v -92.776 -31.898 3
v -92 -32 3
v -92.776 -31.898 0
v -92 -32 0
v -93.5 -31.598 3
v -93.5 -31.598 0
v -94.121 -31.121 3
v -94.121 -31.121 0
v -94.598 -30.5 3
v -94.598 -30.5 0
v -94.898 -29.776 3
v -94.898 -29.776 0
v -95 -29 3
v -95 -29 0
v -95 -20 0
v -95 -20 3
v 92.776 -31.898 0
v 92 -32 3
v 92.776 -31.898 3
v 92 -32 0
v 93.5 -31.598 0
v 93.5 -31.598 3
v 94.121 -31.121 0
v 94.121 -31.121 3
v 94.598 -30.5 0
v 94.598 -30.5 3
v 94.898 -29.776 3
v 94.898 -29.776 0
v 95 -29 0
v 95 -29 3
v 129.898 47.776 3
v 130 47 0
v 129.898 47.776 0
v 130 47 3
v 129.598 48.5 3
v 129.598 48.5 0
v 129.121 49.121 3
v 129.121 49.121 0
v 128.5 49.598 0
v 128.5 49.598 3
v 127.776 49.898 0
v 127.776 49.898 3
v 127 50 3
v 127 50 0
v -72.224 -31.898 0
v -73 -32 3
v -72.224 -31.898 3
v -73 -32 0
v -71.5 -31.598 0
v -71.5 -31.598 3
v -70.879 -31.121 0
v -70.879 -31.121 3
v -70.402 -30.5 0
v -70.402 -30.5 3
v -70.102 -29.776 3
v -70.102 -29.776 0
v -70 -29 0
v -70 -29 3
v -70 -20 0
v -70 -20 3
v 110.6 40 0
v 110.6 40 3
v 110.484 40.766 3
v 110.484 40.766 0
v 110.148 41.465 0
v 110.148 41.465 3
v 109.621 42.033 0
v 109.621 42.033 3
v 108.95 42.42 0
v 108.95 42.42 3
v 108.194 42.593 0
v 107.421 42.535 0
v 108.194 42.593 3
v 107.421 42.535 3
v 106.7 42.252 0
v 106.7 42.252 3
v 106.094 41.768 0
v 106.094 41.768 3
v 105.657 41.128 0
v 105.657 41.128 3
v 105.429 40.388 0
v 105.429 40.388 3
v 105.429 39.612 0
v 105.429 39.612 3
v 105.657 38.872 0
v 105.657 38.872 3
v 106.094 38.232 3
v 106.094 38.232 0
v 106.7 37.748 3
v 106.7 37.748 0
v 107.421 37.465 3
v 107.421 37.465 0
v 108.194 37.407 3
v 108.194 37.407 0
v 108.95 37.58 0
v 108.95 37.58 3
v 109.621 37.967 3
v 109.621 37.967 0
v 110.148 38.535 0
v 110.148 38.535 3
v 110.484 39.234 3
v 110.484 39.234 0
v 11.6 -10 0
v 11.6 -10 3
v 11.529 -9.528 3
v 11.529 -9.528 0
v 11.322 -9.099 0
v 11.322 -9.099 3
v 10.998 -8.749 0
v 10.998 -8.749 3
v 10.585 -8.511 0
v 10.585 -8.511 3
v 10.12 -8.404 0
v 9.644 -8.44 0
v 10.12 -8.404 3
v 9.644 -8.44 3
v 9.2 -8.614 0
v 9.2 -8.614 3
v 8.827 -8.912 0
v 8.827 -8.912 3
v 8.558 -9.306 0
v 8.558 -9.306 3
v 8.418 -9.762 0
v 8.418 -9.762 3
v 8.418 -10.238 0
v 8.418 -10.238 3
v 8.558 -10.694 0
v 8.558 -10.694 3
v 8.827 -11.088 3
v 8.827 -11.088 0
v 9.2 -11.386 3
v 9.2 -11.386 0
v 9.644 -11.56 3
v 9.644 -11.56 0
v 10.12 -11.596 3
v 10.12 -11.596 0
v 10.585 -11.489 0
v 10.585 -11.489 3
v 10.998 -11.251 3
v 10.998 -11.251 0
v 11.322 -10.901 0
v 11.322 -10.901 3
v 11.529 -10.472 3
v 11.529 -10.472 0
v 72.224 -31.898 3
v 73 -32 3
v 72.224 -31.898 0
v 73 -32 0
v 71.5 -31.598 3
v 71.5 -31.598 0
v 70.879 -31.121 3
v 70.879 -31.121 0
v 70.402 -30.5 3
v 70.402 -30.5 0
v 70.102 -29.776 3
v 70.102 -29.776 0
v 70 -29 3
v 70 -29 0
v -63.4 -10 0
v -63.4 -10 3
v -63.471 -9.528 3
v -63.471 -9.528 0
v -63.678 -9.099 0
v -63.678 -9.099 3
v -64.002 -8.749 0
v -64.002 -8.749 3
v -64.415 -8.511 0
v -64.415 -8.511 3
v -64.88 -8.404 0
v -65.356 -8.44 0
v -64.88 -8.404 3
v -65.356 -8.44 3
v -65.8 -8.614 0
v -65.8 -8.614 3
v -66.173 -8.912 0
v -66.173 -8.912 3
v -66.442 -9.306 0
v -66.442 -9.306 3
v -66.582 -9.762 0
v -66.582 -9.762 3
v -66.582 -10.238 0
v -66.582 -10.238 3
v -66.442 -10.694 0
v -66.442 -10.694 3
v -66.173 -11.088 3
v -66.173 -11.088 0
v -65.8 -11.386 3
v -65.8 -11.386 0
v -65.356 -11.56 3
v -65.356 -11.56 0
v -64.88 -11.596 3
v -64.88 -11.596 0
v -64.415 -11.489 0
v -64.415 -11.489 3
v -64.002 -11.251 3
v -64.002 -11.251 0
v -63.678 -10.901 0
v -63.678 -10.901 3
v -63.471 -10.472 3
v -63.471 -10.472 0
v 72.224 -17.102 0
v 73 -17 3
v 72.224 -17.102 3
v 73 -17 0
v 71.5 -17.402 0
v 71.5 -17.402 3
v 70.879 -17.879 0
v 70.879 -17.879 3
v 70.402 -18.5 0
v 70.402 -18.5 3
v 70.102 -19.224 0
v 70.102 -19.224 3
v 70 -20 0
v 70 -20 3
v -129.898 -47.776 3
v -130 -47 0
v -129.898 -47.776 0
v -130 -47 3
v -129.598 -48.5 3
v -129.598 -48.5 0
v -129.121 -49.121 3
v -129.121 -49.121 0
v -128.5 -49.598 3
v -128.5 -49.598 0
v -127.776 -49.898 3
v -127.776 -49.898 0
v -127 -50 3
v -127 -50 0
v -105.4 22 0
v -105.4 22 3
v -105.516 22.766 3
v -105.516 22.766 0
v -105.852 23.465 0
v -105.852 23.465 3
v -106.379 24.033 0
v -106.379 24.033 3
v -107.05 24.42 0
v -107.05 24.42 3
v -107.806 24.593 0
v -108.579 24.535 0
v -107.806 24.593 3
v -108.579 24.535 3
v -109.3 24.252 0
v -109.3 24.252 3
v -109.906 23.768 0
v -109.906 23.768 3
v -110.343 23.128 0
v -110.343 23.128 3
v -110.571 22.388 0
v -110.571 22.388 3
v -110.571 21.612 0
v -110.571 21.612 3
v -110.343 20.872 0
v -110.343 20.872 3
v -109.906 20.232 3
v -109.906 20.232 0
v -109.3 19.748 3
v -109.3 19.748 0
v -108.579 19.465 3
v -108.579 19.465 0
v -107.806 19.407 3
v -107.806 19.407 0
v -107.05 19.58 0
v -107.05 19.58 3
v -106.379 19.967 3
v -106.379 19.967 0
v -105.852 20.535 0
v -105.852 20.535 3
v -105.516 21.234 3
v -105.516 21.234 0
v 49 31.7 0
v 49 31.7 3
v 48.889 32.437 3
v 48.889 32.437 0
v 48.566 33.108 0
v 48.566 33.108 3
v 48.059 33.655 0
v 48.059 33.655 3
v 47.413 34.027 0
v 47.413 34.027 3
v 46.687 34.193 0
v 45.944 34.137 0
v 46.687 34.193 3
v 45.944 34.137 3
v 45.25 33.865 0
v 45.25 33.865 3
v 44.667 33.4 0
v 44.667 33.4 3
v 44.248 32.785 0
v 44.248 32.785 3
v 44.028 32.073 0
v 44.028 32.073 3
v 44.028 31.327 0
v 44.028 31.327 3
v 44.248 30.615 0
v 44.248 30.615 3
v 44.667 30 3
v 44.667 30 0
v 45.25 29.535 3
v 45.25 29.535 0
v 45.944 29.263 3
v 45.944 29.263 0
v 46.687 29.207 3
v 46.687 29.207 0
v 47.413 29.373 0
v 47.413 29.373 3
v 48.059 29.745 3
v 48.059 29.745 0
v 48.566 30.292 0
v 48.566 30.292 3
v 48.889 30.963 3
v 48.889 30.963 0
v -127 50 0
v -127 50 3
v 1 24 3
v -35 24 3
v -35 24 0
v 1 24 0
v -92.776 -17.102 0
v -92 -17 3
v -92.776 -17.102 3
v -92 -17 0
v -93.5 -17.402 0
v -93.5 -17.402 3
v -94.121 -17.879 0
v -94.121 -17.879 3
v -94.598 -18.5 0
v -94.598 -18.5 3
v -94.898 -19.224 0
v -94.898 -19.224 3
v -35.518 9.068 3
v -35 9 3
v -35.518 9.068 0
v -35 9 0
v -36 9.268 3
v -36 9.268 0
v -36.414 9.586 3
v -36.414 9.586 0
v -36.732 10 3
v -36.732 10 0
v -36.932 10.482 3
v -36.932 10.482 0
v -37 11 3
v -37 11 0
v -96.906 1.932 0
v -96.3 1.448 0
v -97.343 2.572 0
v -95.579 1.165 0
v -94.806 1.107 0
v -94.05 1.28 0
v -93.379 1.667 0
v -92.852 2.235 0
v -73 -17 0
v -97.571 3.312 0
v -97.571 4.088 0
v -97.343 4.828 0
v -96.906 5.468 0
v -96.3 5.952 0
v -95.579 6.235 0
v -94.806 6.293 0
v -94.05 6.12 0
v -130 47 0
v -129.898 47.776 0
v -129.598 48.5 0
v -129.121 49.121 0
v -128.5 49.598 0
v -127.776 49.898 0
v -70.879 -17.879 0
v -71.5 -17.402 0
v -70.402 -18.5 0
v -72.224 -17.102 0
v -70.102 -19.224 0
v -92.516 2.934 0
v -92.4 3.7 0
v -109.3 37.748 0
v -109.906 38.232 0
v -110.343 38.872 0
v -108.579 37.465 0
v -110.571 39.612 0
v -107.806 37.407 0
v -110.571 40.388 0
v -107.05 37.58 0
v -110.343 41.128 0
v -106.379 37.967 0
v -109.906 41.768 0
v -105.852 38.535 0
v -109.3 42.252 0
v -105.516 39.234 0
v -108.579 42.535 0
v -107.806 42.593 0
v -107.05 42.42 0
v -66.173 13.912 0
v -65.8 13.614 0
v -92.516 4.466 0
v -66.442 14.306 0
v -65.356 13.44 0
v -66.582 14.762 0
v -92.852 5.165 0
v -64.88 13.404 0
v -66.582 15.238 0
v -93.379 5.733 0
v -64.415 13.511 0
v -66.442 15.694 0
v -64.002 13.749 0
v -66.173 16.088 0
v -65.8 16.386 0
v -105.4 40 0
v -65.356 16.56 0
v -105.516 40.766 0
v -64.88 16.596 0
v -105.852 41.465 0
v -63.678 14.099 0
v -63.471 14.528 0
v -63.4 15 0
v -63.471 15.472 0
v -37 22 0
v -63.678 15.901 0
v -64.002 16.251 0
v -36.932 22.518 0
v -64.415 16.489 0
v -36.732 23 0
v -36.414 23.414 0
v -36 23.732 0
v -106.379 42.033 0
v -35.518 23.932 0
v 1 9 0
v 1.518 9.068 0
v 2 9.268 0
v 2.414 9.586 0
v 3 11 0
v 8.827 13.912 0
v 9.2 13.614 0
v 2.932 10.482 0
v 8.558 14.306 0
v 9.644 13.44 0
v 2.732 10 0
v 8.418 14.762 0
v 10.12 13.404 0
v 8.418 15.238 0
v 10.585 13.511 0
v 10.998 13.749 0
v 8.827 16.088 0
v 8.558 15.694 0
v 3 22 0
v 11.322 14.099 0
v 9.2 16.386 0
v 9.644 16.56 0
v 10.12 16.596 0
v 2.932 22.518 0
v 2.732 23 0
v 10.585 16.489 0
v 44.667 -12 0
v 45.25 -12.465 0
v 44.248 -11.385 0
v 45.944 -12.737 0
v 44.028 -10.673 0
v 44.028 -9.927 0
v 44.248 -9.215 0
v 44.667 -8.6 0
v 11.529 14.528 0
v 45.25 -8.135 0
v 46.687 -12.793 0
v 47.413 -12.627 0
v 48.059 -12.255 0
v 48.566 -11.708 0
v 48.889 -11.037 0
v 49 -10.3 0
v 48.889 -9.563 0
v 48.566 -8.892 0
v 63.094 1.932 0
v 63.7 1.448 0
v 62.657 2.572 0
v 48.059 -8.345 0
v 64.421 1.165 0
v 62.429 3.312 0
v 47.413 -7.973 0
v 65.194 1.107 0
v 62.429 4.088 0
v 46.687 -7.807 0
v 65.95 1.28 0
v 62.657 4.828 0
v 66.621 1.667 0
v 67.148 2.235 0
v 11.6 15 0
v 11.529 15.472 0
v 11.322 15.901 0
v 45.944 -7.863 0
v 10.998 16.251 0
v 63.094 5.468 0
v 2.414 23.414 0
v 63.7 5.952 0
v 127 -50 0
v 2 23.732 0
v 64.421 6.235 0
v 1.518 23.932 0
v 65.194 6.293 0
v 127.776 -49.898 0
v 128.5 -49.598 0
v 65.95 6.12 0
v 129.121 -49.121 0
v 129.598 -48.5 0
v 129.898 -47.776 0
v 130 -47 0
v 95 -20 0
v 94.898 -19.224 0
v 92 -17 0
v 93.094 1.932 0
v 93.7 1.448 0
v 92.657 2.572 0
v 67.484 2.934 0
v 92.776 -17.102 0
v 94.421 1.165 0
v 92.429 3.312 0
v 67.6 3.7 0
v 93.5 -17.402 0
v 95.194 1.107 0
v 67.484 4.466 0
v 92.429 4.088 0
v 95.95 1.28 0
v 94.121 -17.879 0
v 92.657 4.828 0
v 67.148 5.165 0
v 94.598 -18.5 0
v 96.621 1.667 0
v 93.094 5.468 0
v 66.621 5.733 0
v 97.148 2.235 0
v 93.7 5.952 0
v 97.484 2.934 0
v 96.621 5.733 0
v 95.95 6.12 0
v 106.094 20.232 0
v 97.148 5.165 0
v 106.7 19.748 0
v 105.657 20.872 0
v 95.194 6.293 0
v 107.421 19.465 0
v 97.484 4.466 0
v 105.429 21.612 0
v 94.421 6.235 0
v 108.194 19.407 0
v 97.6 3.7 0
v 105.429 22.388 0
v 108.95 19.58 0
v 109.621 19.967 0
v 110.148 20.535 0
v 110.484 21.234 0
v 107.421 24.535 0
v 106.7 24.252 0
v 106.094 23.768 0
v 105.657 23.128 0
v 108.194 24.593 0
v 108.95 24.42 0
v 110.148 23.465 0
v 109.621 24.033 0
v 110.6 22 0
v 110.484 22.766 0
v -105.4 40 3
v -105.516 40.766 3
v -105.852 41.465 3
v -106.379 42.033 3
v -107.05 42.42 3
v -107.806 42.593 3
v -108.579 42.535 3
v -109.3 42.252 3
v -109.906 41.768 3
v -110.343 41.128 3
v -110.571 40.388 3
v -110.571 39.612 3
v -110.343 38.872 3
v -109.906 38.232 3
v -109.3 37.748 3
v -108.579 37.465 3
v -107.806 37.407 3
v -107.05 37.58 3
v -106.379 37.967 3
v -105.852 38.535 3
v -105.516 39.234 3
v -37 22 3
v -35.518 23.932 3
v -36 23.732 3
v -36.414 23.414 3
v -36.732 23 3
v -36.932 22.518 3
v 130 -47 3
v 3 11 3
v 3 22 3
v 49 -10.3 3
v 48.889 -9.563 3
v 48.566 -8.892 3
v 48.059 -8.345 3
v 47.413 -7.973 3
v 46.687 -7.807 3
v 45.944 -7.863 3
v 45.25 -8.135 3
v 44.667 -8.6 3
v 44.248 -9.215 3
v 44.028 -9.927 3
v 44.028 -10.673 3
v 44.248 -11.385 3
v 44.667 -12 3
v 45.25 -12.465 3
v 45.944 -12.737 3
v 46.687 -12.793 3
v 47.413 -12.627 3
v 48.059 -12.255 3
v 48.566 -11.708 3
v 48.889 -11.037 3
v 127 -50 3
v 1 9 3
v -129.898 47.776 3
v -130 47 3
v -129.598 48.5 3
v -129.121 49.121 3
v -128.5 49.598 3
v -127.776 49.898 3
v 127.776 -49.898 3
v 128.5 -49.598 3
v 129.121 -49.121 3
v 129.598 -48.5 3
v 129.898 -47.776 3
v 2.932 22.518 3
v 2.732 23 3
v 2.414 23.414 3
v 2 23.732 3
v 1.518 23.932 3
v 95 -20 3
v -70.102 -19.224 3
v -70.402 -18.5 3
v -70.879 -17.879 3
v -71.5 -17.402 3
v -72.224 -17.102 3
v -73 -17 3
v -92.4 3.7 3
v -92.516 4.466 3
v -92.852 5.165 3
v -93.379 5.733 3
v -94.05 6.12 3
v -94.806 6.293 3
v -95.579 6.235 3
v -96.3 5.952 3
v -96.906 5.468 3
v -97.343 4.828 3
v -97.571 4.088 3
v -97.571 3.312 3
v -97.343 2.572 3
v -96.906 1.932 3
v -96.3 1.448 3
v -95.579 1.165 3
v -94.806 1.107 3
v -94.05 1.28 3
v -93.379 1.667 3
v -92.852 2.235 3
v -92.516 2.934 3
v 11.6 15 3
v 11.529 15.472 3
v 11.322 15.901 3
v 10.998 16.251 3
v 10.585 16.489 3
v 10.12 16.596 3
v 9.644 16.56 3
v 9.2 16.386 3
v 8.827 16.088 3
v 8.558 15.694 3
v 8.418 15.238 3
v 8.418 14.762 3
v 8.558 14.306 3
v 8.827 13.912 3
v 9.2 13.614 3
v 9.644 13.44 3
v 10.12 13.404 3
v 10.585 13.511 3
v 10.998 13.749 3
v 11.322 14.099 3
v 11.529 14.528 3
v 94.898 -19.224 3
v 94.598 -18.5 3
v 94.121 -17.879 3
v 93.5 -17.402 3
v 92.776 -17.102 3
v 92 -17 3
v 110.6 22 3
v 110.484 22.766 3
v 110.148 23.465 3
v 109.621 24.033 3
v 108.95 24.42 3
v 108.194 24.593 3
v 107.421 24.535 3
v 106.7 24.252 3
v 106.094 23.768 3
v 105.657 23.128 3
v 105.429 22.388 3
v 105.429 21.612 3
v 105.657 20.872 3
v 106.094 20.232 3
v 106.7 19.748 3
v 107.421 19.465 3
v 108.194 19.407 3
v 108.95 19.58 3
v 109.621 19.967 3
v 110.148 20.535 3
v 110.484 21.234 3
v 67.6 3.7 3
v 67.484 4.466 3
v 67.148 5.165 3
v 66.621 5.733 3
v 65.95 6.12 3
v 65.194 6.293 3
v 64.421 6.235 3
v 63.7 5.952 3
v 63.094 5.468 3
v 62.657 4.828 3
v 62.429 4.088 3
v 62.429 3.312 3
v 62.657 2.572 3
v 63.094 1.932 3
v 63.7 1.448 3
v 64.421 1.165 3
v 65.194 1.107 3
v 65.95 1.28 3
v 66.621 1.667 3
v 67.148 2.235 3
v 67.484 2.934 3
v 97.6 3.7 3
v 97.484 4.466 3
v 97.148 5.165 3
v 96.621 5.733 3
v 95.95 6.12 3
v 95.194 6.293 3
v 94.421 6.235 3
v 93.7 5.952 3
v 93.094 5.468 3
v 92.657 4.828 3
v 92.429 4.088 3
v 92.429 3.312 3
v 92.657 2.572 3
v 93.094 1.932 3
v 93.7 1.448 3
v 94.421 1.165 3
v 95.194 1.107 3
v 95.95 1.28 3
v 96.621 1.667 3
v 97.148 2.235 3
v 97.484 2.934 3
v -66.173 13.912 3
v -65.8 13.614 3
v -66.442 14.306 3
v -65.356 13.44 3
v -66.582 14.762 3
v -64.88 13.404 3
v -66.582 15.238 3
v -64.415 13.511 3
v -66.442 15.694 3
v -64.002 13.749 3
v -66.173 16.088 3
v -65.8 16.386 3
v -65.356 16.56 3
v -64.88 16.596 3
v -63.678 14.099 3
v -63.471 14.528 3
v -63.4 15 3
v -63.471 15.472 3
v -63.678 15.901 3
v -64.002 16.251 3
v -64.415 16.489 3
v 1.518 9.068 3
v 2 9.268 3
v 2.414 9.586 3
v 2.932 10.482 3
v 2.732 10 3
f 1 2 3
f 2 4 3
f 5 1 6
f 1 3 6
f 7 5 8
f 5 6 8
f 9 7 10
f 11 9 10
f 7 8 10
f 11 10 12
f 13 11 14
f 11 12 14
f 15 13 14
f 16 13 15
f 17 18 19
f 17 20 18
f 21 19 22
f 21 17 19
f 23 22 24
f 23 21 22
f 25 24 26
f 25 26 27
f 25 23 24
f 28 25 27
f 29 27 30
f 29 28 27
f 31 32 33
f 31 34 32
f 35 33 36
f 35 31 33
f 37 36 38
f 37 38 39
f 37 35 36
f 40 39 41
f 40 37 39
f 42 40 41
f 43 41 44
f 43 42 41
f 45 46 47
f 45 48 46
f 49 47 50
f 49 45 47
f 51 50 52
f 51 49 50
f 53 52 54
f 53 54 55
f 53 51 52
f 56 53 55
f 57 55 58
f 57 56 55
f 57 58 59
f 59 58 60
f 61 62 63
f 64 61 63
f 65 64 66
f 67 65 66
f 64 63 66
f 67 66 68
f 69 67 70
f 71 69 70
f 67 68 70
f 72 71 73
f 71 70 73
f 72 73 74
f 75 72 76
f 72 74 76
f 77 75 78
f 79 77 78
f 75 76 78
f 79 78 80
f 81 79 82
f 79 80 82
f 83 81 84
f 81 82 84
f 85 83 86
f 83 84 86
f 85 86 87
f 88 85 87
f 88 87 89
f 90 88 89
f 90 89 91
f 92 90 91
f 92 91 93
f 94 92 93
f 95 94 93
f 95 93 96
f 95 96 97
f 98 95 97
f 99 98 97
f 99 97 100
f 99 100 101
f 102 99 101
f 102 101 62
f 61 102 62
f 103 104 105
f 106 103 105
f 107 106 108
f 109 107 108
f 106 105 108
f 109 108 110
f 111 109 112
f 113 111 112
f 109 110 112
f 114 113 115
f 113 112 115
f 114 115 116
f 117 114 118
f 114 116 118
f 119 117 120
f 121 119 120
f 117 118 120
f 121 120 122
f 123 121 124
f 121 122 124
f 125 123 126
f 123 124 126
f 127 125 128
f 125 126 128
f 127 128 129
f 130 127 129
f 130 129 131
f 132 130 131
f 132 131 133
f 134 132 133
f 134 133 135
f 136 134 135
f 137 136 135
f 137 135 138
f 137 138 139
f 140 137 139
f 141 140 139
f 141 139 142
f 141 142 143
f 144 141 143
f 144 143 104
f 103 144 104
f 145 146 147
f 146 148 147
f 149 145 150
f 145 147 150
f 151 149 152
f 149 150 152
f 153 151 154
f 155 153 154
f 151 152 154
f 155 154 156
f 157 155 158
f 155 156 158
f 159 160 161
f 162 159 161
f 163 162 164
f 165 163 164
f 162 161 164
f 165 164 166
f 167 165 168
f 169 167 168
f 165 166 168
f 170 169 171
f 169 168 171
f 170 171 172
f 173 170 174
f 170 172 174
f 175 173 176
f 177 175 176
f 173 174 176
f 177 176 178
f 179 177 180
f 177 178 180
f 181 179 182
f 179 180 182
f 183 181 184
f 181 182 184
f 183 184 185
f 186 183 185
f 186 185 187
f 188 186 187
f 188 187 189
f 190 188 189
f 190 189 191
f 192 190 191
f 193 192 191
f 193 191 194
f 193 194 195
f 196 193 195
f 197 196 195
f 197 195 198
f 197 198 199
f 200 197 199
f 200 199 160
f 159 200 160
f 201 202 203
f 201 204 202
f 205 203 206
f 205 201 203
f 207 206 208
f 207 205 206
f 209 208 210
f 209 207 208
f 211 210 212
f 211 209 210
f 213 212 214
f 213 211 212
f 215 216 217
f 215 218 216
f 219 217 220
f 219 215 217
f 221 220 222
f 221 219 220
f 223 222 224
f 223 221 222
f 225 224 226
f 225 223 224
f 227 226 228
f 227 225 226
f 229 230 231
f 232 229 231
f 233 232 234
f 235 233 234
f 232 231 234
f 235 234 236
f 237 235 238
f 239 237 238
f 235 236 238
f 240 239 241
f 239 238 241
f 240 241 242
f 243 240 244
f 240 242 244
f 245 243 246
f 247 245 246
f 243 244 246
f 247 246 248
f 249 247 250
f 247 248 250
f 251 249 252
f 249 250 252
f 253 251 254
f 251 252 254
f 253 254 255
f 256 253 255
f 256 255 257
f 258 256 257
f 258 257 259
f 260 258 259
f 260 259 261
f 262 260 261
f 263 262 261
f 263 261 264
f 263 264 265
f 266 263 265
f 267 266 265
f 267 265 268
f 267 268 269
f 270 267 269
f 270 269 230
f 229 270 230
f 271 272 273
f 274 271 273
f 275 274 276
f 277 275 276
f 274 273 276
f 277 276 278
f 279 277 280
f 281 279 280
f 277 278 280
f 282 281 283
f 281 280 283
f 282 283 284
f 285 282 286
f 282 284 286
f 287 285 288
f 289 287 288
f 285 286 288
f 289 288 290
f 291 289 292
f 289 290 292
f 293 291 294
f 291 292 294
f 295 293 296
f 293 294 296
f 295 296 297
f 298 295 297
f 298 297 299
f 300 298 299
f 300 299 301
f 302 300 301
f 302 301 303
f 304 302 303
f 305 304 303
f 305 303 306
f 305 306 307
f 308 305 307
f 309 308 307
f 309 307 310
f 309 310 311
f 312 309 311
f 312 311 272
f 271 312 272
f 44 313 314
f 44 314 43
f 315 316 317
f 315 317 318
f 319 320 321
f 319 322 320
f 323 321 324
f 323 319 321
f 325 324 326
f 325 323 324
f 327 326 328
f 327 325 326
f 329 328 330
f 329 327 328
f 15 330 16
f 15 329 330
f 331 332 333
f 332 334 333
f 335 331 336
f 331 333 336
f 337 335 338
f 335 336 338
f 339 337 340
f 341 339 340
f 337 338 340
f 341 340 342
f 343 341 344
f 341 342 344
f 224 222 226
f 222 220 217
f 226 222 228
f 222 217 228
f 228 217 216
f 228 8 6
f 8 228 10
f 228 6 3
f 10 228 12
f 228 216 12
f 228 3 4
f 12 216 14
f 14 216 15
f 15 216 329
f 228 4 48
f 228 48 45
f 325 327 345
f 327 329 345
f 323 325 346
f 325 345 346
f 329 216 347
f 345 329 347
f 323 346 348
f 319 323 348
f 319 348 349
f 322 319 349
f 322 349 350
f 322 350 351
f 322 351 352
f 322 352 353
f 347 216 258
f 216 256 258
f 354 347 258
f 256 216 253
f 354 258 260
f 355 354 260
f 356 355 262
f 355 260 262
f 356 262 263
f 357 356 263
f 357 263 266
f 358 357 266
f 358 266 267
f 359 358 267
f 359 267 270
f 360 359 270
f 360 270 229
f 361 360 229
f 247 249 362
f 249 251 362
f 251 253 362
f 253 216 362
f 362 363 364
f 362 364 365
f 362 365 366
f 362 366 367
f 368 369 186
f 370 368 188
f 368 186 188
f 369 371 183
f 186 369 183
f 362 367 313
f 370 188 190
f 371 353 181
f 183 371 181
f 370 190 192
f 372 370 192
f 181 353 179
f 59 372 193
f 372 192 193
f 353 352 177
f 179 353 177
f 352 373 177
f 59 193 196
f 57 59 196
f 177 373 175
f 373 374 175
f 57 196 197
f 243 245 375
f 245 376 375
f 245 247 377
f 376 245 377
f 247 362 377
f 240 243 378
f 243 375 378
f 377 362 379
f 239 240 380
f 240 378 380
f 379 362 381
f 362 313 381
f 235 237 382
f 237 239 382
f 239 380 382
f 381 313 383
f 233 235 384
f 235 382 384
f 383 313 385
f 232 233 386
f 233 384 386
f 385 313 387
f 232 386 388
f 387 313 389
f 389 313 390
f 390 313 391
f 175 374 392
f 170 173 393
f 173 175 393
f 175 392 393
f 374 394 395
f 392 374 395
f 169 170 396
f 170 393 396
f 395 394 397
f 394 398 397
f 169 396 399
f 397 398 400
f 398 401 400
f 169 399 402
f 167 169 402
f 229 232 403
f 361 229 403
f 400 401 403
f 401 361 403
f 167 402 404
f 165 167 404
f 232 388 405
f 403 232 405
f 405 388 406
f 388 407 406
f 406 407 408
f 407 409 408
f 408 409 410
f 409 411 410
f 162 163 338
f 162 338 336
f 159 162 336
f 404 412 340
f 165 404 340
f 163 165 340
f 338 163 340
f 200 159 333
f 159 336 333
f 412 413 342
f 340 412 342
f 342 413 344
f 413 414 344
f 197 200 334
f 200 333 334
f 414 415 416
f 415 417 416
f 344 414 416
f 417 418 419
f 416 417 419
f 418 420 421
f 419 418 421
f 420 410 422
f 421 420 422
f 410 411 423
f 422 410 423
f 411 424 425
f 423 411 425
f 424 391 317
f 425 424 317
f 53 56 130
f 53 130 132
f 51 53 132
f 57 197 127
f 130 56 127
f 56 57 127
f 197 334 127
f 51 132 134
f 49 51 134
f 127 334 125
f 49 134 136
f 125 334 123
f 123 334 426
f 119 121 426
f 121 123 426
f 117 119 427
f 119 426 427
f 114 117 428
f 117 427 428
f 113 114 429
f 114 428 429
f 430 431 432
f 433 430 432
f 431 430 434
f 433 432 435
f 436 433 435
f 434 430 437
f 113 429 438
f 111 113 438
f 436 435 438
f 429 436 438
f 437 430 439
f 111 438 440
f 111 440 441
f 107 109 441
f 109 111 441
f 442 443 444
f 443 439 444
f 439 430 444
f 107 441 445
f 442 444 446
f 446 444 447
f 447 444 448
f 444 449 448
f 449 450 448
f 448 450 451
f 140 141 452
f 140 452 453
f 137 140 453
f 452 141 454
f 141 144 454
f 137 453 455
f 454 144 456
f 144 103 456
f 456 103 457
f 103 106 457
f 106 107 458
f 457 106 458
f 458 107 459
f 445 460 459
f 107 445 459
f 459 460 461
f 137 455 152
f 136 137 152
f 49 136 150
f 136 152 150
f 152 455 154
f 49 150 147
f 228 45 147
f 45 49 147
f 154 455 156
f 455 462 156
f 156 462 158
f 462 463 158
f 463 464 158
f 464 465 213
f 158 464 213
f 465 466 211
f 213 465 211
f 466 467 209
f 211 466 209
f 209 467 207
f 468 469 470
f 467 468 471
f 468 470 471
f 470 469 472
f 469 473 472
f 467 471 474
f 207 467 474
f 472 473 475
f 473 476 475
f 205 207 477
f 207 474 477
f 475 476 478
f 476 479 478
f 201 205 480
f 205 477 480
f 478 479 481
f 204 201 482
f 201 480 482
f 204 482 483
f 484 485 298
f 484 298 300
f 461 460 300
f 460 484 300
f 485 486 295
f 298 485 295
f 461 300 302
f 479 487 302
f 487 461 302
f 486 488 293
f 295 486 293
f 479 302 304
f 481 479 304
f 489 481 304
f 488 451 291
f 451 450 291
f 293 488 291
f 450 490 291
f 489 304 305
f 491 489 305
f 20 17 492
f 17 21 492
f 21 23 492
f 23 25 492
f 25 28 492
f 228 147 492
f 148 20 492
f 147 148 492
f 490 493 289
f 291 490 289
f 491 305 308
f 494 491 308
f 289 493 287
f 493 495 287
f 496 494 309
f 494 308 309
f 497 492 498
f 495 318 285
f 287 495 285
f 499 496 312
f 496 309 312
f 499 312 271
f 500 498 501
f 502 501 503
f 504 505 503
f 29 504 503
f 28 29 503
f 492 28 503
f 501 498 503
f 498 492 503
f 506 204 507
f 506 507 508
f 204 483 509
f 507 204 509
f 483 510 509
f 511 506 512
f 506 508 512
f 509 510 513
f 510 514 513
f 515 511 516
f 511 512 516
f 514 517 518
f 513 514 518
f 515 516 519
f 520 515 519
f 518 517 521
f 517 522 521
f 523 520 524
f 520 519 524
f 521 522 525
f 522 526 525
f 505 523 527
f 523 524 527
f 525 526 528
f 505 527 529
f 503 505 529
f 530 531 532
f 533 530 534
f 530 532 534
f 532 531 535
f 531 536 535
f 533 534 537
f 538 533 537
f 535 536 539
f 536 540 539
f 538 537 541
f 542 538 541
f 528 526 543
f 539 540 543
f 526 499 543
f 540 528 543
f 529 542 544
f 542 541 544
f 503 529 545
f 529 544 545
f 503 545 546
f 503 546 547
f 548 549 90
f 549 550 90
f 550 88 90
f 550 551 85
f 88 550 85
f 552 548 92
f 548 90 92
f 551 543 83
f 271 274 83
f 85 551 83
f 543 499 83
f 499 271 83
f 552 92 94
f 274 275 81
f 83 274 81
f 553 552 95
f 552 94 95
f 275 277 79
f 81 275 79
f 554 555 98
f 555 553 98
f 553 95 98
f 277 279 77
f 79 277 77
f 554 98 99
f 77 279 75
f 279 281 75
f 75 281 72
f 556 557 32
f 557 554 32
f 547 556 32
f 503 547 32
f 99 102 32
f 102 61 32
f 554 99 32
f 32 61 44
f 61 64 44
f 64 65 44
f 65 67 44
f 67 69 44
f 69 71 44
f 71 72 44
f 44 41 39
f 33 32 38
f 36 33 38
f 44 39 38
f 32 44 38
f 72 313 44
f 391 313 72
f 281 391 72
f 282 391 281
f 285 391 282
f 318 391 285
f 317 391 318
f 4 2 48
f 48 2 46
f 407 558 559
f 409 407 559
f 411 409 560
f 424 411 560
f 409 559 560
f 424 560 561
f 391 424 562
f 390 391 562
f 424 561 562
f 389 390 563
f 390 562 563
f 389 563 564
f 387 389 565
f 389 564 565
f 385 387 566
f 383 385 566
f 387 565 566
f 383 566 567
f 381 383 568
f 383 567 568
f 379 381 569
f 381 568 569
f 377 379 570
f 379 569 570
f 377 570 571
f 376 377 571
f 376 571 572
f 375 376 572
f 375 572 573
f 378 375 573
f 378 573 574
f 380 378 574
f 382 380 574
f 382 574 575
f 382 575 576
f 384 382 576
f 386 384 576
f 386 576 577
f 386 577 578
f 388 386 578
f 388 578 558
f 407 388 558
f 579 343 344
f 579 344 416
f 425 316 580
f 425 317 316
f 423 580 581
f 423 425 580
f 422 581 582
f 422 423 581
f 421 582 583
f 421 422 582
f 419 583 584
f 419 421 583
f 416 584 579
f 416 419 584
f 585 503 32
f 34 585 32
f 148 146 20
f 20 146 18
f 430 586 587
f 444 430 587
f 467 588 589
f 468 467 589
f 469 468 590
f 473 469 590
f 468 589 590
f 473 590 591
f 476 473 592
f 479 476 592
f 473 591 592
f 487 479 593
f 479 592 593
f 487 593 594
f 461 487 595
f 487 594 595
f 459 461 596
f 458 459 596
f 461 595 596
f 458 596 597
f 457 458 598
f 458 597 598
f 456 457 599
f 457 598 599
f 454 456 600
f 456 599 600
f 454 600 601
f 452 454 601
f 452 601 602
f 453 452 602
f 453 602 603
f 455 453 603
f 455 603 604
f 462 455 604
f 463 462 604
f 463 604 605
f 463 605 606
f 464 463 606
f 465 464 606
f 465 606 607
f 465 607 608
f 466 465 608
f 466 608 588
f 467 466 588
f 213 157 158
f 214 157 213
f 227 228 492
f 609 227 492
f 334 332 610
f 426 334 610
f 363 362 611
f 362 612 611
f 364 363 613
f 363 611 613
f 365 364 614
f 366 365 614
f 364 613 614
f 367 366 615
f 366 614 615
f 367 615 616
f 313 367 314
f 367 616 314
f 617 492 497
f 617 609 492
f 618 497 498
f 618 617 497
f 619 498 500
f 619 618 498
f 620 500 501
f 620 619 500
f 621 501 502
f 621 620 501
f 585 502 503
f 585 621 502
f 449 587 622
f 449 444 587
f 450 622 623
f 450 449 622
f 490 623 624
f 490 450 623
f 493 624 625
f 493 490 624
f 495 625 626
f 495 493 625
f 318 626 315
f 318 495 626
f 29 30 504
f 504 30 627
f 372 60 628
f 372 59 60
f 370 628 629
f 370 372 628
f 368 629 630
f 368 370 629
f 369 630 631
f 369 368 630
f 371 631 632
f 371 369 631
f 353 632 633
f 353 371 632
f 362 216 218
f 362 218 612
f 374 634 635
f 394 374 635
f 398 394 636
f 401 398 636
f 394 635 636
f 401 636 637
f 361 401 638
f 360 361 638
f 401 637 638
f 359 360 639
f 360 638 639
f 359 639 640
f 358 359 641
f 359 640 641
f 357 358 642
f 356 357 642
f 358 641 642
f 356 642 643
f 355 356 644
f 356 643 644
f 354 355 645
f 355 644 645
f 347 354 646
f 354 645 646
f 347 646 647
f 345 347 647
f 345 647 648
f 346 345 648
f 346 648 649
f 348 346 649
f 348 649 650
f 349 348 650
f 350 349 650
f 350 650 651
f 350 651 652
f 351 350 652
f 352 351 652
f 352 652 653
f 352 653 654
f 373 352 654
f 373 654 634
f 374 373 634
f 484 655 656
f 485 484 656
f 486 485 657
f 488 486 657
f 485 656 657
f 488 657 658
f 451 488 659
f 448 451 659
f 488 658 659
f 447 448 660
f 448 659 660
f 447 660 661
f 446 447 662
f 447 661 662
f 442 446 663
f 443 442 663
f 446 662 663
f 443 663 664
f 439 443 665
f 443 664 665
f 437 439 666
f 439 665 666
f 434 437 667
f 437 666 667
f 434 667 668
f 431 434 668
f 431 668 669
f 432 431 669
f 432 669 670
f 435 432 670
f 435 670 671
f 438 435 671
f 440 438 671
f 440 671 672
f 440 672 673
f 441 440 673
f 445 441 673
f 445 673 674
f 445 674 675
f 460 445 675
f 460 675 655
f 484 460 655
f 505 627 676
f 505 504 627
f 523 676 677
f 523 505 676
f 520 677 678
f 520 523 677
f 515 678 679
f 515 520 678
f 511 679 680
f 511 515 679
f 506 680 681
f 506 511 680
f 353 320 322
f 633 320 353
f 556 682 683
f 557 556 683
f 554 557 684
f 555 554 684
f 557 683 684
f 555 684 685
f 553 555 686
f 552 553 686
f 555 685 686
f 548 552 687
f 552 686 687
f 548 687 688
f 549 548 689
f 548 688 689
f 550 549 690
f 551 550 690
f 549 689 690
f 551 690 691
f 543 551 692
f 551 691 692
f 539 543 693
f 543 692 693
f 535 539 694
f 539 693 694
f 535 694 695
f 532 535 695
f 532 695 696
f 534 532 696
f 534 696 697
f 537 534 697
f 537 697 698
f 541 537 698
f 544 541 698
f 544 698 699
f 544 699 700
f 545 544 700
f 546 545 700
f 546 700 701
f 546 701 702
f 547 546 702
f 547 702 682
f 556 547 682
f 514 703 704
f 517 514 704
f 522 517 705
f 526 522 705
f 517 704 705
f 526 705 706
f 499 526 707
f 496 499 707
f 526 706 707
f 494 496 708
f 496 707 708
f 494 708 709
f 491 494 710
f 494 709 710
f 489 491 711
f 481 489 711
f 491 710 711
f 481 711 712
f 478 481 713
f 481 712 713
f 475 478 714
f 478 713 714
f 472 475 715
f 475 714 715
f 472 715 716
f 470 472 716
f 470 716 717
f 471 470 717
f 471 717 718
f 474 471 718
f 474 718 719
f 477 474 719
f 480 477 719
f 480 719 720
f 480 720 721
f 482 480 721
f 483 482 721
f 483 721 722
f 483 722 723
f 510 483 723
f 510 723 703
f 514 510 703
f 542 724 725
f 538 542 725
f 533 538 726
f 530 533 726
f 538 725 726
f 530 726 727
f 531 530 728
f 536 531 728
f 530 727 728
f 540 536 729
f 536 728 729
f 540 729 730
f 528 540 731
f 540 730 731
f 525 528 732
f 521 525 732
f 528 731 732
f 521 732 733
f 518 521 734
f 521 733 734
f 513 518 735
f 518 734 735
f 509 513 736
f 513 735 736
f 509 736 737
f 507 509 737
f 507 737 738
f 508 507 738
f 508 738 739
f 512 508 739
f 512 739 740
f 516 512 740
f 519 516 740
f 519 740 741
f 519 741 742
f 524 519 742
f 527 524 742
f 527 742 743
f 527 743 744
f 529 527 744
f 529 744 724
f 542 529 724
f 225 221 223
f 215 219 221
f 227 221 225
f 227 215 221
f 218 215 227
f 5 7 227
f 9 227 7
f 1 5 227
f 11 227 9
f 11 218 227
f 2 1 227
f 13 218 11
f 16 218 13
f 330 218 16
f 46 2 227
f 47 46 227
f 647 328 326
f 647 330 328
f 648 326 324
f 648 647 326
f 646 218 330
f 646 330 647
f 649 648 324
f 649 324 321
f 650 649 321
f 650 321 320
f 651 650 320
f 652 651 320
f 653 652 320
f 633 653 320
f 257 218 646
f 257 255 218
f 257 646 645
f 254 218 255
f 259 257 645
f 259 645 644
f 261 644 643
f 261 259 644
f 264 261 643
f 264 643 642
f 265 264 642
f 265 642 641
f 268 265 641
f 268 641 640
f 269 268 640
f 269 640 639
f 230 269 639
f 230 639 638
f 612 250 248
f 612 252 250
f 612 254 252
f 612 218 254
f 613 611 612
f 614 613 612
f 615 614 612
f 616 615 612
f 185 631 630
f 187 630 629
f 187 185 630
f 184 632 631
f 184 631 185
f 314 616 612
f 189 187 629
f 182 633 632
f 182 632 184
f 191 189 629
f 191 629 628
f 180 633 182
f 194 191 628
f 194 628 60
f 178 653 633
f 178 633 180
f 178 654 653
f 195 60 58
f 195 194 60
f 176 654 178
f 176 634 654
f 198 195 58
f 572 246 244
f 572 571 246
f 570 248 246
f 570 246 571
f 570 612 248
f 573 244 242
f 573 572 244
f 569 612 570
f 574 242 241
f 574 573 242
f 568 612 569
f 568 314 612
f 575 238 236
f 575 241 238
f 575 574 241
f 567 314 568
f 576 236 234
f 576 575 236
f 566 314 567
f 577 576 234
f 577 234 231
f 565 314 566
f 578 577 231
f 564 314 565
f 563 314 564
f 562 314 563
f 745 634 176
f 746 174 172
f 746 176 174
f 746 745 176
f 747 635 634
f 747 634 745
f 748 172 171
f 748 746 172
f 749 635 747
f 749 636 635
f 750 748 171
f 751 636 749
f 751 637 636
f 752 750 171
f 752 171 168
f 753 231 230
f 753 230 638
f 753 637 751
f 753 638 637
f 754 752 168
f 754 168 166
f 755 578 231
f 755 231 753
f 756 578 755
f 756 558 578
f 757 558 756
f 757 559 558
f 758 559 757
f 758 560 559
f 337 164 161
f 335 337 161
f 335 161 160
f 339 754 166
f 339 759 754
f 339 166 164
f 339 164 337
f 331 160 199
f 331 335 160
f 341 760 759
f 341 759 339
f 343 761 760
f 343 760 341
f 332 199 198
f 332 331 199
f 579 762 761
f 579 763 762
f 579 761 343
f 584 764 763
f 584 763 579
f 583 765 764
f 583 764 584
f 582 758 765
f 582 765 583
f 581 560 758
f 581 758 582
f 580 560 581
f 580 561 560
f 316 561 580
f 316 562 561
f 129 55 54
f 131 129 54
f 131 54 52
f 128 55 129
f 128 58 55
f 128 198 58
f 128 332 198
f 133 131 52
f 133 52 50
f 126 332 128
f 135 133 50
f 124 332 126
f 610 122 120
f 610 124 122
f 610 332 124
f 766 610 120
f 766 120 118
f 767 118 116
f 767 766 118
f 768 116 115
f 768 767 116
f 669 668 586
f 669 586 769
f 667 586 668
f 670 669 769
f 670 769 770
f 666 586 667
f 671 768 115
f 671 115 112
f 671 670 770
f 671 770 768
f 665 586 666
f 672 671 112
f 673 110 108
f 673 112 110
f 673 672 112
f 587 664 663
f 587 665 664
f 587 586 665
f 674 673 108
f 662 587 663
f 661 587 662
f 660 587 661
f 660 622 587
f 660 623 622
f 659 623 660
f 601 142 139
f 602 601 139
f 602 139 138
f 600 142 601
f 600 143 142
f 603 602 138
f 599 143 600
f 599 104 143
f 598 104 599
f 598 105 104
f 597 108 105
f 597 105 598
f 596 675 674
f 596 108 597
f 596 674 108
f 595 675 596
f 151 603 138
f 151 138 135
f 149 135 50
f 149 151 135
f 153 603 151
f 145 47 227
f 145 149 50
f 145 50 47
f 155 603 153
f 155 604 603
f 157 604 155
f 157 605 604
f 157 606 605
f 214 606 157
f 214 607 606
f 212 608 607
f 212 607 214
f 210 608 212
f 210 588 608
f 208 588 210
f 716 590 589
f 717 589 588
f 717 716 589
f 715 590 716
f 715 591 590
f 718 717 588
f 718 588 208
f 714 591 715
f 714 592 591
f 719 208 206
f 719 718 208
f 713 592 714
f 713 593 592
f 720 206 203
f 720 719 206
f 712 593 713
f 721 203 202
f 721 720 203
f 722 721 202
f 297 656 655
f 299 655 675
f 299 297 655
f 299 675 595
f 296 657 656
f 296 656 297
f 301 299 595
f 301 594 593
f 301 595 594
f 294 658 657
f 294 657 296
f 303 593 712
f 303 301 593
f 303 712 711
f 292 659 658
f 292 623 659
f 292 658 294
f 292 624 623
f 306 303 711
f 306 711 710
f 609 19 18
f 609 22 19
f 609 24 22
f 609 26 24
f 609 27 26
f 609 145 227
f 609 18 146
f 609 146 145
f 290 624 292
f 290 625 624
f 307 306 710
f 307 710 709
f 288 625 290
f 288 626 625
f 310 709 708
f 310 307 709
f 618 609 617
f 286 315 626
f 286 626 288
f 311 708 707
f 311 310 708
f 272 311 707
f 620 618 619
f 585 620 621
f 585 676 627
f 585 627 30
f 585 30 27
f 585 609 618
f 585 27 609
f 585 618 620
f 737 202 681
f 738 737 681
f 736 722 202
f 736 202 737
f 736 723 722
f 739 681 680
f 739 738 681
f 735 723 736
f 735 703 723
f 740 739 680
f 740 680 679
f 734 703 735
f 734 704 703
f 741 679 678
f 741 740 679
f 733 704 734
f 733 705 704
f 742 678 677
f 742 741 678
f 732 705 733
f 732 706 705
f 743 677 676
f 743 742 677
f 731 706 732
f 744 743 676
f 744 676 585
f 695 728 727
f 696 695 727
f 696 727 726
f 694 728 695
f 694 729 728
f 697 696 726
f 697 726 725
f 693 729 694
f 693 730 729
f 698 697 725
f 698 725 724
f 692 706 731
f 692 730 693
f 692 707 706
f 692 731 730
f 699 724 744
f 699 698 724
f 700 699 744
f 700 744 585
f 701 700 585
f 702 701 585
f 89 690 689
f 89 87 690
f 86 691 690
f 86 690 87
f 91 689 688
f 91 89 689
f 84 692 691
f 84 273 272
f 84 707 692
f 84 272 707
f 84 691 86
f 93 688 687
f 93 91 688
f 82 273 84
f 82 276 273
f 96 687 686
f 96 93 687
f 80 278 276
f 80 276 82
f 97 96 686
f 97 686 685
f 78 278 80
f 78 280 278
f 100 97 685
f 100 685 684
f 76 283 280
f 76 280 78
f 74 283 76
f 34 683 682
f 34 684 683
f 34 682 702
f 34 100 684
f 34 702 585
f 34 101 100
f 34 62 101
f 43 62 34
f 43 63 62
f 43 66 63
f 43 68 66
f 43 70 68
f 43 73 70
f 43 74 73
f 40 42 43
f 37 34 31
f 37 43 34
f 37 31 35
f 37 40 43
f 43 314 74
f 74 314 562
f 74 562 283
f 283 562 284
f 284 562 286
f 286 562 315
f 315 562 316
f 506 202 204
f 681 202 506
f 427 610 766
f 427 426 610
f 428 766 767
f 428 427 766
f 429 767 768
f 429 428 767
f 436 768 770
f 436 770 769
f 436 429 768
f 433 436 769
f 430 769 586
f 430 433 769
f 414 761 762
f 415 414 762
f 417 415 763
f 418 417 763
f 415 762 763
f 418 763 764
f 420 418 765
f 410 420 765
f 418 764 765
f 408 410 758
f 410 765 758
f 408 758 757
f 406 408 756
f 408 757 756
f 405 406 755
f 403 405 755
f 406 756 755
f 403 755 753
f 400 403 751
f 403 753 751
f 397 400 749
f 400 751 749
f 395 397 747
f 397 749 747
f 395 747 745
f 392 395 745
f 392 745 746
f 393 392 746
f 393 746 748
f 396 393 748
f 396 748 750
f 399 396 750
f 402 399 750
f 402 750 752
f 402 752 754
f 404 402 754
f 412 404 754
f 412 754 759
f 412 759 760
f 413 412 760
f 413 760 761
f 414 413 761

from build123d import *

# Parameters (mm, degrees)
SKETCH_1_W          = 260
SKETCH_1_H          = 100
EXTRUDE_1_DEPTH     = 3
FILLET_1_R          = 3
SKETCH_4_W          = 25
SKETCH_4_H          = 15
CUT_EXTRUDE_3_DEPTH = 500
FILLET_2_R          = 3
SKETCH_6_R          = 1.6
SKETCH_6_W          = 40
SKETCH_6_H          = 15
CUT_EXTRUDE_5_DEPTH = 10
FILLET_4_R          = 2
SKETCH_7_R          = 2.5
CUT_EXTRUDE_6_DEPTH = 10
SKETCH_8_R          = 2.6
CUT_EXTRUDE_7_DEPTH = 10
SKETCH_9_R          = 2.6
CUT_EXTRUDE_8_DEPTH = 10


with BuildPart() as part:
    # 草图1 → 凸台-拉伸1 (new body)
    with BuildSketch(Plane.XY):
        Rectangle(SKETCH_1_W, SKETCH_1_H)
    extrude(amount=EXTRUDE_1_DEPTH)

    # 圆角1
    fillet_1_edges = [part.edges().sort_by_distance(p)[0] for p in [
        (-130, 50, 1.5),
        (130, 50, 1.5),
        (130, -50, 1.5),
        (-130, -50, 1.5),
    ]]
    fillet(fillet_1_edges, radius=FILLET_1_R)

    # 草图4 → 切除-拉伸3 (cut)
    with BuildSketch(Plane.XY.offset(3)):
        with Locations((-82.5, -24.5)):
            Rectangle(SKETCH_4_W, SKETCH_4_H)
        with Locations((82.5, -24.5)):
            Rectangle(SKETCH_4_W, SKETCH_4_H)
    extrude(amount=-CUT_EXTRUDE_3_DEPTH, mode=Mode.SUBTRACT)

    # 圆角2
    fillet_2_edges = [part.edges().sort_by_distance(p)[0] for p in [
        (-95, -32, 1.5),
        (-95, -17, 1.5),
        (-70, -17, 1.5),
        (-70, -32, 1.5),
        (70, -17, 1.5),
        (95, -17, 1.5),
        (95, -32, 1.5),
        (70, -32, 1.5),
    ]]
    fillet(fillet_2_edges, radius=FILLET_2_R)

    # 草图6 → 切除-拉伸5 (cut)
    with BuildSketch(Plane.XY.offset(3)):
        with Locations((-65, 15)):
            Circle(SKETCH_6_R)
        with Locations((10, 15)):
            Circle(SKETCH_6_R)
        with Locations((10, -10)):
            Circle(SKETCH_6_R)
        with Locations((-65, -10)):
            Circle(SKETCH_6_R)
        with Locations((-17, 16.5)):
            Rectangle(SKETCH_6_W, SKETCH_6_H)
    extrude(amount=-CUT_EXTRUDE_5_DEPTH, mode=Mode.SUBTRACT)

    # 圆角4
    fillet_4_edges = [part.edges().sort_by_distance(p)[0] for p in [
        (-37, 9, 1.5),
        (-37, 24, 1.5),
        (3, 24, 1.5),
        (3, 9, 1.5),
    ]]
    fillet(fillet_4_edges, radius=FILLET_4_R)

    # 草图7 → 切除-拉伸6 (cut)
    with BuildSketch(Plane.XY.offset(3)):
        with Locations((46.5, 31.7)):
            Circle(SKETCH_7_R)
        with Locations((46.5, -10.3)):
            Circle(SKETCH_7_R)
    extrude(amount=-CUT_EXTRUDE_6_DEPTH, mode=Mode.SUBTRACT)

    # 草图8 → 切除-拉伸7 (cut)
    with BuildSketch(Plane.XY.offset(3)):
        with Locations((-108, 40)):
            Circle(SKETCH_8_R)
        with Locations((108, 40)):
            Circle(SKETCH_8_R)
        with Locations((-108, 22)):
            Circle(SKETCH_8_R)
        with Locations((108, 22)):
            Circle(SKETCH_8_R)
        with Locations((-95, 3.7)):
            Circle(SKETCH_8_R)
        with Locations((95, 3.7)):
            Circle(SKETCH_8_R)
    extrude(amount=-CUT_EXTRUDE_7_DEPTH, mode=Mode.SUBTRACT)

    # 草图9 → 切除-拉伸8 (cut)
    with BuildSketch(Plane.XY.offset(3)):
        with Locations((65, 3.7)):
            Circle(SKETCH_9_R)
    extrude(amount=-CUT_EXTRUDE_8_DEPTH, mode=Mode.SUBTRACT)


solid = part.part
